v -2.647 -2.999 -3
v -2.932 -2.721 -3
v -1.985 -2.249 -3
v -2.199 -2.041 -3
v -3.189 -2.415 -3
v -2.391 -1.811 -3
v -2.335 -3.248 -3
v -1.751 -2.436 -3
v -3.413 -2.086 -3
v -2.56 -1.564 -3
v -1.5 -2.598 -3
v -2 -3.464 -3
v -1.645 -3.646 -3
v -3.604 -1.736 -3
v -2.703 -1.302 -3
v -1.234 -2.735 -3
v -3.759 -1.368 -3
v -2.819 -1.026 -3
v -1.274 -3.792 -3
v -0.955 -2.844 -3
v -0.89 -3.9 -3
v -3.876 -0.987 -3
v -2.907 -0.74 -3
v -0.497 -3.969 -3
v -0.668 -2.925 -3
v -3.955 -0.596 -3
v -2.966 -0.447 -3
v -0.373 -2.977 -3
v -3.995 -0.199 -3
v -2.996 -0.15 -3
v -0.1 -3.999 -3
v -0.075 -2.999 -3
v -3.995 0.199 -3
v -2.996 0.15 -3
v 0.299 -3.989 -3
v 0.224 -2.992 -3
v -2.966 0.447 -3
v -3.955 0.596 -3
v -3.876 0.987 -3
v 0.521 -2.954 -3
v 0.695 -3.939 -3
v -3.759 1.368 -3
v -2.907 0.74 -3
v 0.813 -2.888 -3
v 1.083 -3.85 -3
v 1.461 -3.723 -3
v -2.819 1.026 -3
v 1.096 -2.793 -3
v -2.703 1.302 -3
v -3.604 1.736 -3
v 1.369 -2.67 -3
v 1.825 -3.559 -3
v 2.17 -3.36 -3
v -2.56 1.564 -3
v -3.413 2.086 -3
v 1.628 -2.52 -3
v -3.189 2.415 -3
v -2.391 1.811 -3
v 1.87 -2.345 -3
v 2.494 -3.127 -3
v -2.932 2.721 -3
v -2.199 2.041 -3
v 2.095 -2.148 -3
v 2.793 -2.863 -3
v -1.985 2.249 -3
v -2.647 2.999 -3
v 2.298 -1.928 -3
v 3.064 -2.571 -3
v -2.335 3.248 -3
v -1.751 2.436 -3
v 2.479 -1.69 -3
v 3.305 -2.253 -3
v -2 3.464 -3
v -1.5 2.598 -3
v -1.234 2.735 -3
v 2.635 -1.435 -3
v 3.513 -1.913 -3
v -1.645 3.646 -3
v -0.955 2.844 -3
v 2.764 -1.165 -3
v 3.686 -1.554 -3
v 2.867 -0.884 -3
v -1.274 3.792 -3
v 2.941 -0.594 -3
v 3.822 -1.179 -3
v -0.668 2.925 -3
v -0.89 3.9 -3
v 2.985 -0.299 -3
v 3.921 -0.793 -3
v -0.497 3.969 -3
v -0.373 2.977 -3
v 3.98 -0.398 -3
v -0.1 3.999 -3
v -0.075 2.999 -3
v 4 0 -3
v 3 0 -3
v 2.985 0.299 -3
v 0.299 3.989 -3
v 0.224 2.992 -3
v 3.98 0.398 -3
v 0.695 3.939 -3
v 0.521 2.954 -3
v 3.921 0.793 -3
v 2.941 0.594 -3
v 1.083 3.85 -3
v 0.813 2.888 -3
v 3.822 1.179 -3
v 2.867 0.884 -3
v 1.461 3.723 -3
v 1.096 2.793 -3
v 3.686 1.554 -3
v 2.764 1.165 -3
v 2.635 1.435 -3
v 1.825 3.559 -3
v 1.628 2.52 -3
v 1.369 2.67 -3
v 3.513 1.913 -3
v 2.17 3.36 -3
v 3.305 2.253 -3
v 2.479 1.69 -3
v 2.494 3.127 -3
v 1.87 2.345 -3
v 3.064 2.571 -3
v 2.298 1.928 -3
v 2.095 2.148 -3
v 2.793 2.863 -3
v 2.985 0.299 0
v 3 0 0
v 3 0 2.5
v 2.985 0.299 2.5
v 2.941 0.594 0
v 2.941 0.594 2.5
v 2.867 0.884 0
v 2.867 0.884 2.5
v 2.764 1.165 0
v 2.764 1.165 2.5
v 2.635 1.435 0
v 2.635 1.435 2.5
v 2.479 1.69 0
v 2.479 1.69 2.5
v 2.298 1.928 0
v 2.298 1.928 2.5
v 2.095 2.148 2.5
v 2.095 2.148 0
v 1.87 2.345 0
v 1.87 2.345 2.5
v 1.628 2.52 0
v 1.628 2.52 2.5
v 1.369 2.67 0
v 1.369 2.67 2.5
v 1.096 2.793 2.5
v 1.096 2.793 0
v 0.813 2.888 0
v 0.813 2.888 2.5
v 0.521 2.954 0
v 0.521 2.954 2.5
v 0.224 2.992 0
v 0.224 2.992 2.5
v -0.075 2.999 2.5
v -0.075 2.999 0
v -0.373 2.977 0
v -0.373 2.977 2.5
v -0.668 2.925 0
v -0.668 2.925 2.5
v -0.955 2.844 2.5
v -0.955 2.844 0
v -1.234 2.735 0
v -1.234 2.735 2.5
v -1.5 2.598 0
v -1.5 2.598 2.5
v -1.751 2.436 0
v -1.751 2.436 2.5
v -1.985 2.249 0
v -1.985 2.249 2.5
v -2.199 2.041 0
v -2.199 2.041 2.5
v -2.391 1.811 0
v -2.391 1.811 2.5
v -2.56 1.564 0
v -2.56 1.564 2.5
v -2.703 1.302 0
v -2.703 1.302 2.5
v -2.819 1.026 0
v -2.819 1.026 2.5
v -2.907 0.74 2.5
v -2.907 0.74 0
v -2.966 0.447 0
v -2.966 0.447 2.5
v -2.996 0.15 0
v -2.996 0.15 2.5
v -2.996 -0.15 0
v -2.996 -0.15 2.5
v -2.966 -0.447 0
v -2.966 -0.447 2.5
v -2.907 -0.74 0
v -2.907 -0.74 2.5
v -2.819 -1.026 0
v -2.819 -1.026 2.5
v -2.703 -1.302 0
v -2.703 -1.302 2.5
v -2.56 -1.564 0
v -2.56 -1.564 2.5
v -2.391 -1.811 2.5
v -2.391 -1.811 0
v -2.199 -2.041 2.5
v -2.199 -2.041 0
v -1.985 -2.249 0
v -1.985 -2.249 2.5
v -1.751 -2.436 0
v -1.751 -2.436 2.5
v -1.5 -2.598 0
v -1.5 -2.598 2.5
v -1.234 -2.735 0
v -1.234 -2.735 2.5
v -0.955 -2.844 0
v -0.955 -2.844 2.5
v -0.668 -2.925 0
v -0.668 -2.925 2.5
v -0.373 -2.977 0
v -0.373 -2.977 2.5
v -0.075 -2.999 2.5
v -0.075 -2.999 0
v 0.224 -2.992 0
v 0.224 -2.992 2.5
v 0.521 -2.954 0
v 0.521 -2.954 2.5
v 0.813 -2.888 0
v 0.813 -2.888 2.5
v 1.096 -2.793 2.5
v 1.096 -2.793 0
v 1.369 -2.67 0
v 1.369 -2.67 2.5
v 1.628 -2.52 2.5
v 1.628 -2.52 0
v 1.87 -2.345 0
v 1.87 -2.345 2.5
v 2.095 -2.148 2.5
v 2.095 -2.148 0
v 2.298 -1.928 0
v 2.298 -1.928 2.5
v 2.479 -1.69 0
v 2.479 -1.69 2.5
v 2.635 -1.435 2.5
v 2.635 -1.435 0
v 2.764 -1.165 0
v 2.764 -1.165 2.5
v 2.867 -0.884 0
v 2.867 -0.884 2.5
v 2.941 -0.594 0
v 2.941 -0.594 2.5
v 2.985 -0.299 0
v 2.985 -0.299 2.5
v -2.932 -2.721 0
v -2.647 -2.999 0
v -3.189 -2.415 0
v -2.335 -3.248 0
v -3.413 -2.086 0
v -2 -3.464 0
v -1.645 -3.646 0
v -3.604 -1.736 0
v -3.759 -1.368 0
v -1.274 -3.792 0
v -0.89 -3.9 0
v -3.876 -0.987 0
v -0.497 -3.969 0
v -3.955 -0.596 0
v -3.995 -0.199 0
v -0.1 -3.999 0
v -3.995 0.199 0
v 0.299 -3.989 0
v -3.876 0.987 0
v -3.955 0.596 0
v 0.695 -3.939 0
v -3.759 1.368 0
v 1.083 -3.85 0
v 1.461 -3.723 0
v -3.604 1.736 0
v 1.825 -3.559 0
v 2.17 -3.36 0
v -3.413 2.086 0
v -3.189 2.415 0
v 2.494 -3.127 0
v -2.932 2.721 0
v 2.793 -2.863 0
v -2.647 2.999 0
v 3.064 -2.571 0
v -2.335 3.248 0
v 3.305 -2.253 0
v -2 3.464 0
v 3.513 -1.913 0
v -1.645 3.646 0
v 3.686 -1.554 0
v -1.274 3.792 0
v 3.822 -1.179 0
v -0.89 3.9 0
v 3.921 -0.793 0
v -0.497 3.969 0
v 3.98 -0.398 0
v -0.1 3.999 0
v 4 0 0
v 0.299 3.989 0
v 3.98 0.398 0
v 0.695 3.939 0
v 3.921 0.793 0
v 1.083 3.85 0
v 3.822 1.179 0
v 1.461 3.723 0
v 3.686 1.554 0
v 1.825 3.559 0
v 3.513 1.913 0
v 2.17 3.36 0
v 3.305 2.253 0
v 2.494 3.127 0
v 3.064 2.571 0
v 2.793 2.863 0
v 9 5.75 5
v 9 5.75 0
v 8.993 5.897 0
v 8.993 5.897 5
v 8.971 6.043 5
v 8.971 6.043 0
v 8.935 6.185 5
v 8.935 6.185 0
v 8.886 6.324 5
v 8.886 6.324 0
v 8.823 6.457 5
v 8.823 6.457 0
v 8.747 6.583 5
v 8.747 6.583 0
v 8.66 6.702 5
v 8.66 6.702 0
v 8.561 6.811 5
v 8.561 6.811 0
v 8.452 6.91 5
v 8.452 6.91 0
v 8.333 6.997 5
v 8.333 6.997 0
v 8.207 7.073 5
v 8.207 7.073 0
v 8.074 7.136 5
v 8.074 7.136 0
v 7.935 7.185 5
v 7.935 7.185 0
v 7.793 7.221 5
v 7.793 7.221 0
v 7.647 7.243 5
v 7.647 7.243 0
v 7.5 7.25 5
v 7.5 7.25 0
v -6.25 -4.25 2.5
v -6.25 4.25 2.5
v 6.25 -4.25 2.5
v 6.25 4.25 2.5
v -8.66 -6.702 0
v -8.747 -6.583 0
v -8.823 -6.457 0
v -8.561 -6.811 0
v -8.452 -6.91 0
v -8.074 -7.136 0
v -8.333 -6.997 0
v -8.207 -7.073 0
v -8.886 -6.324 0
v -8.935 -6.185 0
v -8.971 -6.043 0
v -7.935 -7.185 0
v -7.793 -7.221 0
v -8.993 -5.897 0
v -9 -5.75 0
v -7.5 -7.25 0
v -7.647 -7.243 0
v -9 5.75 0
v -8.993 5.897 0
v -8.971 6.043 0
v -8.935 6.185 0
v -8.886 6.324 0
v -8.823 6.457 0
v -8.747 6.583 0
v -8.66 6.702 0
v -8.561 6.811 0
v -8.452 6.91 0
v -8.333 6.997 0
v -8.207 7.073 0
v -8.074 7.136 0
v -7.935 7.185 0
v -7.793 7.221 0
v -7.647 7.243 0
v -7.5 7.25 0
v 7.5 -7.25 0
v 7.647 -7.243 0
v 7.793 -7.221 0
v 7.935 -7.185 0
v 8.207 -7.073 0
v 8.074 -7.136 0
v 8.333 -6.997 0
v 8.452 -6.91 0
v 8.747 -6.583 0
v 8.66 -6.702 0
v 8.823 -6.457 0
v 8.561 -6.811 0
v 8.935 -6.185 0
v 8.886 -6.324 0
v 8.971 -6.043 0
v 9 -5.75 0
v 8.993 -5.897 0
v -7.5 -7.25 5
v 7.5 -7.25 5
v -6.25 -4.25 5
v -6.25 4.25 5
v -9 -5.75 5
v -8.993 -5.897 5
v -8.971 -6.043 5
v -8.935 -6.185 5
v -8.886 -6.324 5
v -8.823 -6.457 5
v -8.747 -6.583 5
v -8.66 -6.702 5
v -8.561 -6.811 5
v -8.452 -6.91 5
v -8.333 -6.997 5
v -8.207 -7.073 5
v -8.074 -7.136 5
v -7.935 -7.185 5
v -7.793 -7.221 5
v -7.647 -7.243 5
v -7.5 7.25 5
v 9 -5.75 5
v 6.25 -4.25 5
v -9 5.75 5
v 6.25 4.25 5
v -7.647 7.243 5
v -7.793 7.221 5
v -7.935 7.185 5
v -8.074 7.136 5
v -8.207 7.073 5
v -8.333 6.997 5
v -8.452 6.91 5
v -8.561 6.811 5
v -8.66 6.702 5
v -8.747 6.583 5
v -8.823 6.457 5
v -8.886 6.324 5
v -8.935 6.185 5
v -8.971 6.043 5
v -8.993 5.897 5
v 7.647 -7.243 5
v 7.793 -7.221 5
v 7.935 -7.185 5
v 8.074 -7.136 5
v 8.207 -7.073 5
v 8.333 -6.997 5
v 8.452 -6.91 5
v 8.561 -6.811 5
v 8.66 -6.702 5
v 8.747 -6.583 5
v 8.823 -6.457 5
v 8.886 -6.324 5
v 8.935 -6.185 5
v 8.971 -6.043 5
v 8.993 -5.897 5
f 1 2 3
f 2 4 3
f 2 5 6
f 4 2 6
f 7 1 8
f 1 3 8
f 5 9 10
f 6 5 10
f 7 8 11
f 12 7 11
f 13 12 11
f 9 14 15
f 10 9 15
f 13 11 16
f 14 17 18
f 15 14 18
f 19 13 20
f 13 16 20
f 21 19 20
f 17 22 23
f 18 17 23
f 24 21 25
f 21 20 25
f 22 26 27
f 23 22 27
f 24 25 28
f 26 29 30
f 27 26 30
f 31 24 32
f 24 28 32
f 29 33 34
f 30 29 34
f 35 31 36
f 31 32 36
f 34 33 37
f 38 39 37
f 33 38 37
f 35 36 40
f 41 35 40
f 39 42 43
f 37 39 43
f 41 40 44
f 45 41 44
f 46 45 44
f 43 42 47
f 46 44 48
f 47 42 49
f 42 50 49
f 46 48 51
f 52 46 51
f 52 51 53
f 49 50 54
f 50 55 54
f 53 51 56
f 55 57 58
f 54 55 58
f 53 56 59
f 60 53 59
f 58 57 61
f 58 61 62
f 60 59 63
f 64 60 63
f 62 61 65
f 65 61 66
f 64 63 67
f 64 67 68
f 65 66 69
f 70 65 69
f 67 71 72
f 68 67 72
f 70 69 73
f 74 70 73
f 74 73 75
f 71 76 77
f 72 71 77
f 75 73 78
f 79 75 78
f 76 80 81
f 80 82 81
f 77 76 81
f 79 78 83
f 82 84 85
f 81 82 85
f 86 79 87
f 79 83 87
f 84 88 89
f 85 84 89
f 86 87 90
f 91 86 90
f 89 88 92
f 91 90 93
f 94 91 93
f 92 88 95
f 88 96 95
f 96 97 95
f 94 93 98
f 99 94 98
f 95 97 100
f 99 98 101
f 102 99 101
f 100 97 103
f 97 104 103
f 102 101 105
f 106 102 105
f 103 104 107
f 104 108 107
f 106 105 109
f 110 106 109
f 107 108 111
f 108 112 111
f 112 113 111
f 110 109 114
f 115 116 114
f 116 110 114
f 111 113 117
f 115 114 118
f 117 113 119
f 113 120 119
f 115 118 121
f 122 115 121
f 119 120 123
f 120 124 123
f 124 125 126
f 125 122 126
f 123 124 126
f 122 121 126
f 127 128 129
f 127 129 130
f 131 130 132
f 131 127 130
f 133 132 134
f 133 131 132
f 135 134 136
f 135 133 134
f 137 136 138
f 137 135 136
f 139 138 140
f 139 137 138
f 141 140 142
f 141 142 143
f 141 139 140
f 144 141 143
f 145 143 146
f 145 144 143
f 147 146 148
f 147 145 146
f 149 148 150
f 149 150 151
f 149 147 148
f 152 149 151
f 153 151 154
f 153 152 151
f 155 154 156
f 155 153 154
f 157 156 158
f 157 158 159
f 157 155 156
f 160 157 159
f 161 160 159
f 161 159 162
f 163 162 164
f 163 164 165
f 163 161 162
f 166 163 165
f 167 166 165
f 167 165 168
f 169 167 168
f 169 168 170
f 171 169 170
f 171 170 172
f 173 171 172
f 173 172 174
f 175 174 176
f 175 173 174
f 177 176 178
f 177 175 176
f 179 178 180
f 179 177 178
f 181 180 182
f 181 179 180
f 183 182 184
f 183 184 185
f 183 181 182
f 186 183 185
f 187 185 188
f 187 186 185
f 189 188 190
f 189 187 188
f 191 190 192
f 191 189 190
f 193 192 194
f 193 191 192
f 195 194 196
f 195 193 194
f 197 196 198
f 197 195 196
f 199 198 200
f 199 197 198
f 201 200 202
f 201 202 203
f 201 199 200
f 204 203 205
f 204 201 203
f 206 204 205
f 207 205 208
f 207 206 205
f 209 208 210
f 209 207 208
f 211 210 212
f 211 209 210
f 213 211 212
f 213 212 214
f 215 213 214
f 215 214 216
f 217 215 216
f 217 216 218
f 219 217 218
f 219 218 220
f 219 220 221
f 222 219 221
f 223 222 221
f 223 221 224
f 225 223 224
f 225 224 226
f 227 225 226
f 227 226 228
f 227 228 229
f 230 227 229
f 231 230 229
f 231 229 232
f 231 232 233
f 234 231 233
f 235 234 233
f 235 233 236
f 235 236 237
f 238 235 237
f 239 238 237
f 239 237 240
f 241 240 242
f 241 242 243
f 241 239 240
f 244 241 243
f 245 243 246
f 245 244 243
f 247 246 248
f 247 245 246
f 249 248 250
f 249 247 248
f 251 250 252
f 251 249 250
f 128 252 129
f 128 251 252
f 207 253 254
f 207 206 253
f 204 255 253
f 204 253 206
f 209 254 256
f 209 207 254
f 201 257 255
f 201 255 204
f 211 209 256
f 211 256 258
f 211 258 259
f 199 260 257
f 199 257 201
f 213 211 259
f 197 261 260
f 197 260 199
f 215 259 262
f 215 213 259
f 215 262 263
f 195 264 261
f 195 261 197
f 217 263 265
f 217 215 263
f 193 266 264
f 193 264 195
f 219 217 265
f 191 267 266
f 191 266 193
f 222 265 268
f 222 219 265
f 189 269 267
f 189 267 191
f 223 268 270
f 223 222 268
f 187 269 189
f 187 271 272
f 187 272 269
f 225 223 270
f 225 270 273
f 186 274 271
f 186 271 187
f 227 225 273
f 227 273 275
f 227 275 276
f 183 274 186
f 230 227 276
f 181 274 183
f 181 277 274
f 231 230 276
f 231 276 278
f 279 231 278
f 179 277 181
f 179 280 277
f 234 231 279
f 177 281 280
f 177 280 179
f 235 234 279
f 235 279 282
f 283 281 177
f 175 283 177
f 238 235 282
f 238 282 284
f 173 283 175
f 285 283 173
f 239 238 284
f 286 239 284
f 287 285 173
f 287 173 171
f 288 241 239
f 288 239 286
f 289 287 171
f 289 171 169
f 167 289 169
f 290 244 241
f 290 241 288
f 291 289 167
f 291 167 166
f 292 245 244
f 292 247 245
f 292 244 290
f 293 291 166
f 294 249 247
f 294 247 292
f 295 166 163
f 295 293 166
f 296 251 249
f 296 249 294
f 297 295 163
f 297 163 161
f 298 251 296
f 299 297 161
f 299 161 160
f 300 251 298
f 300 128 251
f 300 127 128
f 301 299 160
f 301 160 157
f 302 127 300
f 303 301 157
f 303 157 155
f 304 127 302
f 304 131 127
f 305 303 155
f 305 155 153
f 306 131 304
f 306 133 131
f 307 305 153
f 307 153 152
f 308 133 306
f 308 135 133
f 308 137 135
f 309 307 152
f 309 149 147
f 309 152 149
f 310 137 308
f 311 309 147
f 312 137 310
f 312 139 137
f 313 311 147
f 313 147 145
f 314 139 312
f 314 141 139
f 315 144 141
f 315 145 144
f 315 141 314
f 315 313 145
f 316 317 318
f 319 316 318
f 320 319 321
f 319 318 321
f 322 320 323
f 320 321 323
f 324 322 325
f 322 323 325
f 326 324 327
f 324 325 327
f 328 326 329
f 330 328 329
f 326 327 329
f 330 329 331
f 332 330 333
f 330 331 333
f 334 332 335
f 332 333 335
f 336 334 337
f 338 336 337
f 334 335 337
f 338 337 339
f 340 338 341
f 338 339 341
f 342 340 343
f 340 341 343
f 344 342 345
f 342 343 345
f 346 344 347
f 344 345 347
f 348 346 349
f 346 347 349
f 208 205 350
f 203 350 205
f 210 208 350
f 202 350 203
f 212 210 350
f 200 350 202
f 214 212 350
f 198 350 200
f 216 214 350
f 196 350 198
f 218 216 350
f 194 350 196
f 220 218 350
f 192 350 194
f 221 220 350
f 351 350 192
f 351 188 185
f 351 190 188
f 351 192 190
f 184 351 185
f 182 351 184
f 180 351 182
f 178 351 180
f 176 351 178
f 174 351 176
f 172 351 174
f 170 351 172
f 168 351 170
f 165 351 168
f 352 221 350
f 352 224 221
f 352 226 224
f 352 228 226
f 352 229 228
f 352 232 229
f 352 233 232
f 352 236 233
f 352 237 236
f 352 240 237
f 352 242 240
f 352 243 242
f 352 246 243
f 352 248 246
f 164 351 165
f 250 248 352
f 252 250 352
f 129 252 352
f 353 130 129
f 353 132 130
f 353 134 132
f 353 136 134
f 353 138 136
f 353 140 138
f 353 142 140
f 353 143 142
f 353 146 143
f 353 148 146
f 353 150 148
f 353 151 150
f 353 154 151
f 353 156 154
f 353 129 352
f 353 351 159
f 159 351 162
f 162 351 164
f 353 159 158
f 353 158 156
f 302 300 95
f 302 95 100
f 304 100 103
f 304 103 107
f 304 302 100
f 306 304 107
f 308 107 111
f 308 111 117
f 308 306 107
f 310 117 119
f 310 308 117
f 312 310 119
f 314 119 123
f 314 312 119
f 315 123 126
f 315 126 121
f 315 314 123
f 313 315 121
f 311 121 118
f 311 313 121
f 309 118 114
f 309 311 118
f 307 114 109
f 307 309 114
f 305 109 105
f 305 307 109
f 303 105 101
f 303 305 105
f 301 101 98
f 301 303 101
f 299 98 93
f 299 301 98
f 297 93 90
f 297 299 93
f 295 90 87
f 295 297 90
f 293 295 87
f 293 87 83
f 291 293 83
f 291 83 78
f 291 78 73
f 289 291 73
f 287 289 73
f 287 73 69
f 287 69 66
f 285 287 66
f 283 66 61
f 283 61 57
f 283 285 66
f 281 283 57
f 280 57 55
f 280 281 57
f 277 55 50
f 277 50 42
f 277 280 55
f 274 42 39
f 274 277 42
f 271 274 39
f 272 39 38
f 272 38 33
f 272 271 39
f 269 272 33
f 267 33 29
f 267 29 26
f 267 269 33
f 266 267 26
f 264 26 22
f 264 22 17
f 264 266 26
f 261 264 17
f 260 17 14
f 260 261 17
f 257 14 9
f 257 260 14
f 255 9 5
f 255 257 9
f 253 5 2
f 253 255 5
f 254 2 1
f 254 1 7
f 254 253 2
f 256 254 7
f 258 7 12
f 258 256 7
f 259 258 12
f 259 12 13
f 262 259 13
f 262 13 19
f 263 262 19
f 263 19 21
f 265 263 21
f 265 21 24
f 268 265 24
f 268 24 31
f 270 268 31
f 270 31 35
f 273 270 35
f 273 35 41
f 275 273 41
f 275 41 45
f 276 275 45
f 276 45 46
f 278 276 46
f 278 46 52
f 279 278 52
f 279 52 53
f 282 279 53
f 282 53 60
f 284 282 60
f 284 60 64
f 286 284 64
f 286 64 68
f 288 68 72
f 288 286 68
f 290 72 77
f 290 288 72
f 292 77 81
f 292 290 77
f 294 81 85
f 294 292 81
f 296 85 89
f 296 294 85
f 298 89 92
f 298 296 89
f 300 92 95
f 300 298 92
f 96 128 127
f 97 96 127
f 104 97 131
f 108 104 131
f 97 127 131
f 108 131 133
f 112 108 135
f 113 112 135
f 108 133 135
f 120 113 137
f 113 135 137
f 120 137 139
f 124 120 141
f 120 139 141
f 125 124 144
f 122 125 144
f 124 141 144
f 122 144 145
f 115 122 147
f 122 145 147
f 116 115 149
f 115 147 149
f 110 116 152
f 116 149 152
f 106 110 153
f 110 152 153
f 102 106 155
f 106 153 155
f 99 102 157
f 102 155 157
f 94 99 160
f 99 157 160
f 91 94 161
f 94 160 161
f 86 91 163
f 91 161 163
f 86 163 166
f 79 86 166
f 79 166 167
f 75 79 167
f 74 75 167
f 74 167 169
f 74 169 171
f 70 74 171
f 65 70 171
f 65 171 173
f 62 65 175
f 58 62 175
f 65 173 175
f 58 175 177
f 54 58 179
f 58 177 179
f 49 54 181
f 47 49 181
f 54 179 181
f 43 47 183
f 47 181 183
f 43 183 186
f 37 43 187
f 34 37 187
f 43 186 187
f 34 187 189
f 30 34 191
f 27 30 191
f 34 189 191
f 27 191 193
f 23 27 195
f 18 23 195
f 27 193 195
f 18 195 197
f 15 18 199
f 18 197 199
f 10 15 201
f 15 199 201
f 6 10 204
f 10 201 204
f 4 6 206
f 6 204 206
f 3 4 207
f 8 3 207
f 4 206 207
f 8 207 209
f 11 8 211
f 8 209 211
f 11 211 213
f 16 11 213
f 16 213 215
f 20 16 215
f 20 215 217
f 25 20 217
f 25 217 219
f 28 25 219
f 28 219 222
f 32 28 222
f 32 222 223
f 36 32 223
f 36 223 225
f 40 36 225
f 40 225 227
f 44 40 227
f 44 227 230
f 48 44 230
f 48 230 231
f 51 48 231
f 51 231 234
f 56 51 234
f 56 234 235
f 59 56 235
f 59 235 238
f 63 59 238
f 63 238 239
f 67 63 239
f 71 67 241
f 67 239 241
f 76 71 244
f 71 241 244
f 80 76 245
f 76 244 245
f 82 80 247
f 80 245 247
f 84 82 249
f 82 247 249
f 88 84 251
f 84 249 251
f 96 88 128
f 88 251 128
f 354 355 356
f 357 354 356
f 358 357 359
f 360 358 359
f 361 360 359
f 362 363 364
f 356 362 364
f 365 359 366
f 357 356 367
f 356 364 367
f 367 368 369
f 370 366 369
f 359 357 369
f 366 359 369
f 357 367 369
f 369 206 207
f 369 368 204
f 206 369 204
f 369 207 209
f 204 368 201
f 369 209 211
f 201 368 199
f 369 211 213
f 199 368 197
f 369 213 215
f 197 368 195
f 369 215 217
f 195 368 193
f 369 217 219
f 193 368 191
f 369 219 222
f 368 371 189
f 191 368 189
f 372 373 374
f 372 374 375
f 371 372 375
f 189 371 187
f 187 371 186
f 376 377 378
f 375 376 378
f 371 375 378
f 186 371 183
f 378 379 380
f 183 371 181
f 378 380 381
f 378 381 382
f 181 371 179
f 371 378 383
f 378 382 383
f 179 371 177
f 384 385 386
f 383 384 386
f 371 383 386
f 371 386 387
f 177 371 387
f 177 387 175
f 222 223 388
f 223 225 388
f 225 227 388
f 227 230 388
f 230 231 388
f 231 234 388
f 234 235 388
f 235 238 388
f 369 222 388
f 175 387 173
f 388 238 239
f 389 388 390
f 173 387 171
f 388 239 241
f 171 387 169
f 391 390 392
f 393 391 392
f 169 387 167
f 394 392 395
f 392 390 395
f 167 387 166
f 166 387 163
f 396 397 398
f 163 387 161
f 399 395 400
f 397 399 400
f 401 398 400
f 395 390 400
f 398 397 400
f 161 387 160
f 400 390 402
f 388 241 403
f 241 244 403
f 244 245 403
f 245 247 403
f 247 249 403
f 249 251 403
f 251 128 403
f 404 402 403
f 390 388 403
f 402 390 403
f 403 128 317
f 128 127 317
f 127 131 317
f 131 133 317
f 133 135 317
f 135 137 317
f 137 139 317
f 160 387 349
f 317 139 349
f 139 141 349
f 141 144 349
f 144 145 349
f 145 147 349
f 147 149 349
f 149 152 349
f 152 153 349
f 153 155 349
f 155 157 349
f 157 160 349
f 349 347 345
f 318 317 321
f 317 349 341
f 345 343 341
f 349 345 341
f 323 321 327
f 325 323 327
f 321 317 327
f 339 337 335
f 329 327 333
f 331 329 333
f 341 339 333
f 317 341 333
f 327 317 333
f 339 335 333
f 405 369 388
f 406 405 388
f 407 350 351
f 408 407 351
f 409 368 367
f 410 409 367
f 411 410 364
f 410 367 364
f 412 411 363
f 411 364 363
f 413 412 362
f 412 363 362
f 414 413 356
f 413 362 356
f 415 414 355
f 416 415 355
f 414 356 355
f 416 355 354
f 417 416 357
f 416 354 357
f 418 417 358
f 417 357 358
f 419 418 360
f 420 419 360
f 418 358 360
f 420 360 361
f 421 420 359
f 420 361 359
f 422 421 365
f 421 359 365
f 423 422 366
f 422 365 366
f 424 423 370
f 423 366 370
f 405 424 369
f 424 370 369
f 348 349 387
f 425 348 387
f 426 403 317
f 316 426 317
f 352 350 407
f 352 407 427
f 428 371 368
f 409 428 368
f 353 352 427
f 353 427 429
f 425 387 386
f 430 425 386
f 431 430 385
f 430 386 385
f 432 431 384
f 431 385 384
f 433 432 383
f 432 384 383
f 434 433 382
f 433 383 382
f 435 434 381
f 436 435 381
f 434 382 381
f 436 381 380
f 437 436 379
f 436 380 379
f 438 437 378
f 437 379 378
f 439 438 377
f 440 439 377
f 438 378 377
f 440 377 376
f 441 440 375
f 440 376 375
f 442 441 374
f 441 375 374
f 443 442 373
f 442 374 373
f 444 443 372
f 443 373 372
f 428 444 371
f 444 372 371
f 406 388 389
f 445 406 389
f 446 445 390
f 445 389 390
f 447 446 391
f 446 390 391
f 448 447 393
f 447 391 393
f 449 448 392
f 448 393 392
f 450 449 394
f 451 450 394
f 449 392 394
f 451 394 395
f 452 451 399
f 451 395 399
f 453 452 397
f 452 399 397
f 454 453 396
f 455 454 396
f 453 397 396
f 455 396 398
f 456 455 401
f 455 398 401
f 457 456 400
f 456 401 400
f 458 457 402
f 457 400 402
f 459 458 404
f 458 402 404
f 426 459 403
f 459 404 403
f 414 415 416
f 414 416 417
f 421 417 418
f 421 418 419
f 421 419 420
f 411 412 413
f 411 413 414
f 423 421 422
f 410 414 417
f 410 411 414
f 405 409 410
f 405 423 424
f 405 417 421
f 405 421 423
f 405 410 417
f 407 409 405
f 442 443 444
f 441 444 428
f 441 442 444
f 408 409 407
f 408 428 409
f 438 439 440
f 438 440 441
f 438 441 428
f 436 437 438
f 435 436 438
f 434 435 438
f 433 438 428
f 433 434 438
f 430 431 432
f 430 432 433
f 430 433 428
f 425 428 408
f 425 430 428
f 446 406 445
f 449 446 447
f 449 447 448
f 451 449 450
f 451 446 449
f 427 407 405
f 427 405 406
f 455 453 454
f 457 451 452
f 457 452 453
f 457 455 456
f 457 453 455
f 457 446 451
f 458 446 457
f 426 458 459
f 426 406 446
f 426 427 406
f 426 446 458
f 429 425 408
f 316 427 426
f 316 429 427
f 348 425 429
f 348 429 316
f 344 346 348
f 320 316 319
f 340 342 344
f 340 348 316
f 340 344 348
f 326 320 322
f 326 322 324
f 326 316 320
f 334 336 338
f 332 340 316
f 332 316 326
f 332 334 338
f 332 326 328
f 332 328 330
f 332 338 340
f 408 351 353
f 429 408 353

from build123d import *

# Parameters (mm, degrees)
F0_W     = 12.5
F0_H     = 8.5
F0_R     = 4
F0_R_2   = 3
F1_DEPTH = 2.5
F2_DEPTH = 5
F3_DEPTH = 3


with BuildPart() as f1:
    # F0 (on Top) → F1 (new body)
    with BuildSketch(Plane.XY):
        Rectangle(F0_W, F0_H)
        Circle(F0_R, mode=Mode.SUBTRACT)
        Circle(F0_R)
        Circle(F0_R_2, mode=Mode.SUBTRACT)
    extrude(amount=F1_DEPTH)

    # F0 (on Top) → F2 (join)
    with BuildSketch(Plane.XY):
        with BuildLine():
            Line((7.5, 7.25), (-7.5, 7.25))
            ThreePointArc((-7.5, 7.25), (-8.56066, 6.81066), (-9, 5.75))
            Line((-9, 5.75), (-9, -5.75))
            ThreePointArc((-9, -5.75), (-8.56066, -6.81066), (-7.5, -7.25))
            Line((-7.5, -7.25), (7.5, -7.25))
            ThreePointArc((7.5, -7.25), (8.56066, -6.81066), (9, -5.75))
            Line((9, -5.75), (9, 5.75))
            ThreePointArc((9, 5.75), (8.56066, 6.81066), (7.5, 7.25))
        make_face()
        Rectangle(F0_W, F0_H, mode=Mode.SUBTRACT)
    extrude(amount=F2_DEPTH)


with BuildPart() as f3:
    # F0 (on Top) → F3 (new body)
    with BuildSketch(Plane.XY):
        Circle(F0_R)
        Circle(F0_R_2, mode=Mode.SUBTRACT)
    extrude(amount=-F3_DEPTH)


solid = Compound([f1.part, f3.part])
